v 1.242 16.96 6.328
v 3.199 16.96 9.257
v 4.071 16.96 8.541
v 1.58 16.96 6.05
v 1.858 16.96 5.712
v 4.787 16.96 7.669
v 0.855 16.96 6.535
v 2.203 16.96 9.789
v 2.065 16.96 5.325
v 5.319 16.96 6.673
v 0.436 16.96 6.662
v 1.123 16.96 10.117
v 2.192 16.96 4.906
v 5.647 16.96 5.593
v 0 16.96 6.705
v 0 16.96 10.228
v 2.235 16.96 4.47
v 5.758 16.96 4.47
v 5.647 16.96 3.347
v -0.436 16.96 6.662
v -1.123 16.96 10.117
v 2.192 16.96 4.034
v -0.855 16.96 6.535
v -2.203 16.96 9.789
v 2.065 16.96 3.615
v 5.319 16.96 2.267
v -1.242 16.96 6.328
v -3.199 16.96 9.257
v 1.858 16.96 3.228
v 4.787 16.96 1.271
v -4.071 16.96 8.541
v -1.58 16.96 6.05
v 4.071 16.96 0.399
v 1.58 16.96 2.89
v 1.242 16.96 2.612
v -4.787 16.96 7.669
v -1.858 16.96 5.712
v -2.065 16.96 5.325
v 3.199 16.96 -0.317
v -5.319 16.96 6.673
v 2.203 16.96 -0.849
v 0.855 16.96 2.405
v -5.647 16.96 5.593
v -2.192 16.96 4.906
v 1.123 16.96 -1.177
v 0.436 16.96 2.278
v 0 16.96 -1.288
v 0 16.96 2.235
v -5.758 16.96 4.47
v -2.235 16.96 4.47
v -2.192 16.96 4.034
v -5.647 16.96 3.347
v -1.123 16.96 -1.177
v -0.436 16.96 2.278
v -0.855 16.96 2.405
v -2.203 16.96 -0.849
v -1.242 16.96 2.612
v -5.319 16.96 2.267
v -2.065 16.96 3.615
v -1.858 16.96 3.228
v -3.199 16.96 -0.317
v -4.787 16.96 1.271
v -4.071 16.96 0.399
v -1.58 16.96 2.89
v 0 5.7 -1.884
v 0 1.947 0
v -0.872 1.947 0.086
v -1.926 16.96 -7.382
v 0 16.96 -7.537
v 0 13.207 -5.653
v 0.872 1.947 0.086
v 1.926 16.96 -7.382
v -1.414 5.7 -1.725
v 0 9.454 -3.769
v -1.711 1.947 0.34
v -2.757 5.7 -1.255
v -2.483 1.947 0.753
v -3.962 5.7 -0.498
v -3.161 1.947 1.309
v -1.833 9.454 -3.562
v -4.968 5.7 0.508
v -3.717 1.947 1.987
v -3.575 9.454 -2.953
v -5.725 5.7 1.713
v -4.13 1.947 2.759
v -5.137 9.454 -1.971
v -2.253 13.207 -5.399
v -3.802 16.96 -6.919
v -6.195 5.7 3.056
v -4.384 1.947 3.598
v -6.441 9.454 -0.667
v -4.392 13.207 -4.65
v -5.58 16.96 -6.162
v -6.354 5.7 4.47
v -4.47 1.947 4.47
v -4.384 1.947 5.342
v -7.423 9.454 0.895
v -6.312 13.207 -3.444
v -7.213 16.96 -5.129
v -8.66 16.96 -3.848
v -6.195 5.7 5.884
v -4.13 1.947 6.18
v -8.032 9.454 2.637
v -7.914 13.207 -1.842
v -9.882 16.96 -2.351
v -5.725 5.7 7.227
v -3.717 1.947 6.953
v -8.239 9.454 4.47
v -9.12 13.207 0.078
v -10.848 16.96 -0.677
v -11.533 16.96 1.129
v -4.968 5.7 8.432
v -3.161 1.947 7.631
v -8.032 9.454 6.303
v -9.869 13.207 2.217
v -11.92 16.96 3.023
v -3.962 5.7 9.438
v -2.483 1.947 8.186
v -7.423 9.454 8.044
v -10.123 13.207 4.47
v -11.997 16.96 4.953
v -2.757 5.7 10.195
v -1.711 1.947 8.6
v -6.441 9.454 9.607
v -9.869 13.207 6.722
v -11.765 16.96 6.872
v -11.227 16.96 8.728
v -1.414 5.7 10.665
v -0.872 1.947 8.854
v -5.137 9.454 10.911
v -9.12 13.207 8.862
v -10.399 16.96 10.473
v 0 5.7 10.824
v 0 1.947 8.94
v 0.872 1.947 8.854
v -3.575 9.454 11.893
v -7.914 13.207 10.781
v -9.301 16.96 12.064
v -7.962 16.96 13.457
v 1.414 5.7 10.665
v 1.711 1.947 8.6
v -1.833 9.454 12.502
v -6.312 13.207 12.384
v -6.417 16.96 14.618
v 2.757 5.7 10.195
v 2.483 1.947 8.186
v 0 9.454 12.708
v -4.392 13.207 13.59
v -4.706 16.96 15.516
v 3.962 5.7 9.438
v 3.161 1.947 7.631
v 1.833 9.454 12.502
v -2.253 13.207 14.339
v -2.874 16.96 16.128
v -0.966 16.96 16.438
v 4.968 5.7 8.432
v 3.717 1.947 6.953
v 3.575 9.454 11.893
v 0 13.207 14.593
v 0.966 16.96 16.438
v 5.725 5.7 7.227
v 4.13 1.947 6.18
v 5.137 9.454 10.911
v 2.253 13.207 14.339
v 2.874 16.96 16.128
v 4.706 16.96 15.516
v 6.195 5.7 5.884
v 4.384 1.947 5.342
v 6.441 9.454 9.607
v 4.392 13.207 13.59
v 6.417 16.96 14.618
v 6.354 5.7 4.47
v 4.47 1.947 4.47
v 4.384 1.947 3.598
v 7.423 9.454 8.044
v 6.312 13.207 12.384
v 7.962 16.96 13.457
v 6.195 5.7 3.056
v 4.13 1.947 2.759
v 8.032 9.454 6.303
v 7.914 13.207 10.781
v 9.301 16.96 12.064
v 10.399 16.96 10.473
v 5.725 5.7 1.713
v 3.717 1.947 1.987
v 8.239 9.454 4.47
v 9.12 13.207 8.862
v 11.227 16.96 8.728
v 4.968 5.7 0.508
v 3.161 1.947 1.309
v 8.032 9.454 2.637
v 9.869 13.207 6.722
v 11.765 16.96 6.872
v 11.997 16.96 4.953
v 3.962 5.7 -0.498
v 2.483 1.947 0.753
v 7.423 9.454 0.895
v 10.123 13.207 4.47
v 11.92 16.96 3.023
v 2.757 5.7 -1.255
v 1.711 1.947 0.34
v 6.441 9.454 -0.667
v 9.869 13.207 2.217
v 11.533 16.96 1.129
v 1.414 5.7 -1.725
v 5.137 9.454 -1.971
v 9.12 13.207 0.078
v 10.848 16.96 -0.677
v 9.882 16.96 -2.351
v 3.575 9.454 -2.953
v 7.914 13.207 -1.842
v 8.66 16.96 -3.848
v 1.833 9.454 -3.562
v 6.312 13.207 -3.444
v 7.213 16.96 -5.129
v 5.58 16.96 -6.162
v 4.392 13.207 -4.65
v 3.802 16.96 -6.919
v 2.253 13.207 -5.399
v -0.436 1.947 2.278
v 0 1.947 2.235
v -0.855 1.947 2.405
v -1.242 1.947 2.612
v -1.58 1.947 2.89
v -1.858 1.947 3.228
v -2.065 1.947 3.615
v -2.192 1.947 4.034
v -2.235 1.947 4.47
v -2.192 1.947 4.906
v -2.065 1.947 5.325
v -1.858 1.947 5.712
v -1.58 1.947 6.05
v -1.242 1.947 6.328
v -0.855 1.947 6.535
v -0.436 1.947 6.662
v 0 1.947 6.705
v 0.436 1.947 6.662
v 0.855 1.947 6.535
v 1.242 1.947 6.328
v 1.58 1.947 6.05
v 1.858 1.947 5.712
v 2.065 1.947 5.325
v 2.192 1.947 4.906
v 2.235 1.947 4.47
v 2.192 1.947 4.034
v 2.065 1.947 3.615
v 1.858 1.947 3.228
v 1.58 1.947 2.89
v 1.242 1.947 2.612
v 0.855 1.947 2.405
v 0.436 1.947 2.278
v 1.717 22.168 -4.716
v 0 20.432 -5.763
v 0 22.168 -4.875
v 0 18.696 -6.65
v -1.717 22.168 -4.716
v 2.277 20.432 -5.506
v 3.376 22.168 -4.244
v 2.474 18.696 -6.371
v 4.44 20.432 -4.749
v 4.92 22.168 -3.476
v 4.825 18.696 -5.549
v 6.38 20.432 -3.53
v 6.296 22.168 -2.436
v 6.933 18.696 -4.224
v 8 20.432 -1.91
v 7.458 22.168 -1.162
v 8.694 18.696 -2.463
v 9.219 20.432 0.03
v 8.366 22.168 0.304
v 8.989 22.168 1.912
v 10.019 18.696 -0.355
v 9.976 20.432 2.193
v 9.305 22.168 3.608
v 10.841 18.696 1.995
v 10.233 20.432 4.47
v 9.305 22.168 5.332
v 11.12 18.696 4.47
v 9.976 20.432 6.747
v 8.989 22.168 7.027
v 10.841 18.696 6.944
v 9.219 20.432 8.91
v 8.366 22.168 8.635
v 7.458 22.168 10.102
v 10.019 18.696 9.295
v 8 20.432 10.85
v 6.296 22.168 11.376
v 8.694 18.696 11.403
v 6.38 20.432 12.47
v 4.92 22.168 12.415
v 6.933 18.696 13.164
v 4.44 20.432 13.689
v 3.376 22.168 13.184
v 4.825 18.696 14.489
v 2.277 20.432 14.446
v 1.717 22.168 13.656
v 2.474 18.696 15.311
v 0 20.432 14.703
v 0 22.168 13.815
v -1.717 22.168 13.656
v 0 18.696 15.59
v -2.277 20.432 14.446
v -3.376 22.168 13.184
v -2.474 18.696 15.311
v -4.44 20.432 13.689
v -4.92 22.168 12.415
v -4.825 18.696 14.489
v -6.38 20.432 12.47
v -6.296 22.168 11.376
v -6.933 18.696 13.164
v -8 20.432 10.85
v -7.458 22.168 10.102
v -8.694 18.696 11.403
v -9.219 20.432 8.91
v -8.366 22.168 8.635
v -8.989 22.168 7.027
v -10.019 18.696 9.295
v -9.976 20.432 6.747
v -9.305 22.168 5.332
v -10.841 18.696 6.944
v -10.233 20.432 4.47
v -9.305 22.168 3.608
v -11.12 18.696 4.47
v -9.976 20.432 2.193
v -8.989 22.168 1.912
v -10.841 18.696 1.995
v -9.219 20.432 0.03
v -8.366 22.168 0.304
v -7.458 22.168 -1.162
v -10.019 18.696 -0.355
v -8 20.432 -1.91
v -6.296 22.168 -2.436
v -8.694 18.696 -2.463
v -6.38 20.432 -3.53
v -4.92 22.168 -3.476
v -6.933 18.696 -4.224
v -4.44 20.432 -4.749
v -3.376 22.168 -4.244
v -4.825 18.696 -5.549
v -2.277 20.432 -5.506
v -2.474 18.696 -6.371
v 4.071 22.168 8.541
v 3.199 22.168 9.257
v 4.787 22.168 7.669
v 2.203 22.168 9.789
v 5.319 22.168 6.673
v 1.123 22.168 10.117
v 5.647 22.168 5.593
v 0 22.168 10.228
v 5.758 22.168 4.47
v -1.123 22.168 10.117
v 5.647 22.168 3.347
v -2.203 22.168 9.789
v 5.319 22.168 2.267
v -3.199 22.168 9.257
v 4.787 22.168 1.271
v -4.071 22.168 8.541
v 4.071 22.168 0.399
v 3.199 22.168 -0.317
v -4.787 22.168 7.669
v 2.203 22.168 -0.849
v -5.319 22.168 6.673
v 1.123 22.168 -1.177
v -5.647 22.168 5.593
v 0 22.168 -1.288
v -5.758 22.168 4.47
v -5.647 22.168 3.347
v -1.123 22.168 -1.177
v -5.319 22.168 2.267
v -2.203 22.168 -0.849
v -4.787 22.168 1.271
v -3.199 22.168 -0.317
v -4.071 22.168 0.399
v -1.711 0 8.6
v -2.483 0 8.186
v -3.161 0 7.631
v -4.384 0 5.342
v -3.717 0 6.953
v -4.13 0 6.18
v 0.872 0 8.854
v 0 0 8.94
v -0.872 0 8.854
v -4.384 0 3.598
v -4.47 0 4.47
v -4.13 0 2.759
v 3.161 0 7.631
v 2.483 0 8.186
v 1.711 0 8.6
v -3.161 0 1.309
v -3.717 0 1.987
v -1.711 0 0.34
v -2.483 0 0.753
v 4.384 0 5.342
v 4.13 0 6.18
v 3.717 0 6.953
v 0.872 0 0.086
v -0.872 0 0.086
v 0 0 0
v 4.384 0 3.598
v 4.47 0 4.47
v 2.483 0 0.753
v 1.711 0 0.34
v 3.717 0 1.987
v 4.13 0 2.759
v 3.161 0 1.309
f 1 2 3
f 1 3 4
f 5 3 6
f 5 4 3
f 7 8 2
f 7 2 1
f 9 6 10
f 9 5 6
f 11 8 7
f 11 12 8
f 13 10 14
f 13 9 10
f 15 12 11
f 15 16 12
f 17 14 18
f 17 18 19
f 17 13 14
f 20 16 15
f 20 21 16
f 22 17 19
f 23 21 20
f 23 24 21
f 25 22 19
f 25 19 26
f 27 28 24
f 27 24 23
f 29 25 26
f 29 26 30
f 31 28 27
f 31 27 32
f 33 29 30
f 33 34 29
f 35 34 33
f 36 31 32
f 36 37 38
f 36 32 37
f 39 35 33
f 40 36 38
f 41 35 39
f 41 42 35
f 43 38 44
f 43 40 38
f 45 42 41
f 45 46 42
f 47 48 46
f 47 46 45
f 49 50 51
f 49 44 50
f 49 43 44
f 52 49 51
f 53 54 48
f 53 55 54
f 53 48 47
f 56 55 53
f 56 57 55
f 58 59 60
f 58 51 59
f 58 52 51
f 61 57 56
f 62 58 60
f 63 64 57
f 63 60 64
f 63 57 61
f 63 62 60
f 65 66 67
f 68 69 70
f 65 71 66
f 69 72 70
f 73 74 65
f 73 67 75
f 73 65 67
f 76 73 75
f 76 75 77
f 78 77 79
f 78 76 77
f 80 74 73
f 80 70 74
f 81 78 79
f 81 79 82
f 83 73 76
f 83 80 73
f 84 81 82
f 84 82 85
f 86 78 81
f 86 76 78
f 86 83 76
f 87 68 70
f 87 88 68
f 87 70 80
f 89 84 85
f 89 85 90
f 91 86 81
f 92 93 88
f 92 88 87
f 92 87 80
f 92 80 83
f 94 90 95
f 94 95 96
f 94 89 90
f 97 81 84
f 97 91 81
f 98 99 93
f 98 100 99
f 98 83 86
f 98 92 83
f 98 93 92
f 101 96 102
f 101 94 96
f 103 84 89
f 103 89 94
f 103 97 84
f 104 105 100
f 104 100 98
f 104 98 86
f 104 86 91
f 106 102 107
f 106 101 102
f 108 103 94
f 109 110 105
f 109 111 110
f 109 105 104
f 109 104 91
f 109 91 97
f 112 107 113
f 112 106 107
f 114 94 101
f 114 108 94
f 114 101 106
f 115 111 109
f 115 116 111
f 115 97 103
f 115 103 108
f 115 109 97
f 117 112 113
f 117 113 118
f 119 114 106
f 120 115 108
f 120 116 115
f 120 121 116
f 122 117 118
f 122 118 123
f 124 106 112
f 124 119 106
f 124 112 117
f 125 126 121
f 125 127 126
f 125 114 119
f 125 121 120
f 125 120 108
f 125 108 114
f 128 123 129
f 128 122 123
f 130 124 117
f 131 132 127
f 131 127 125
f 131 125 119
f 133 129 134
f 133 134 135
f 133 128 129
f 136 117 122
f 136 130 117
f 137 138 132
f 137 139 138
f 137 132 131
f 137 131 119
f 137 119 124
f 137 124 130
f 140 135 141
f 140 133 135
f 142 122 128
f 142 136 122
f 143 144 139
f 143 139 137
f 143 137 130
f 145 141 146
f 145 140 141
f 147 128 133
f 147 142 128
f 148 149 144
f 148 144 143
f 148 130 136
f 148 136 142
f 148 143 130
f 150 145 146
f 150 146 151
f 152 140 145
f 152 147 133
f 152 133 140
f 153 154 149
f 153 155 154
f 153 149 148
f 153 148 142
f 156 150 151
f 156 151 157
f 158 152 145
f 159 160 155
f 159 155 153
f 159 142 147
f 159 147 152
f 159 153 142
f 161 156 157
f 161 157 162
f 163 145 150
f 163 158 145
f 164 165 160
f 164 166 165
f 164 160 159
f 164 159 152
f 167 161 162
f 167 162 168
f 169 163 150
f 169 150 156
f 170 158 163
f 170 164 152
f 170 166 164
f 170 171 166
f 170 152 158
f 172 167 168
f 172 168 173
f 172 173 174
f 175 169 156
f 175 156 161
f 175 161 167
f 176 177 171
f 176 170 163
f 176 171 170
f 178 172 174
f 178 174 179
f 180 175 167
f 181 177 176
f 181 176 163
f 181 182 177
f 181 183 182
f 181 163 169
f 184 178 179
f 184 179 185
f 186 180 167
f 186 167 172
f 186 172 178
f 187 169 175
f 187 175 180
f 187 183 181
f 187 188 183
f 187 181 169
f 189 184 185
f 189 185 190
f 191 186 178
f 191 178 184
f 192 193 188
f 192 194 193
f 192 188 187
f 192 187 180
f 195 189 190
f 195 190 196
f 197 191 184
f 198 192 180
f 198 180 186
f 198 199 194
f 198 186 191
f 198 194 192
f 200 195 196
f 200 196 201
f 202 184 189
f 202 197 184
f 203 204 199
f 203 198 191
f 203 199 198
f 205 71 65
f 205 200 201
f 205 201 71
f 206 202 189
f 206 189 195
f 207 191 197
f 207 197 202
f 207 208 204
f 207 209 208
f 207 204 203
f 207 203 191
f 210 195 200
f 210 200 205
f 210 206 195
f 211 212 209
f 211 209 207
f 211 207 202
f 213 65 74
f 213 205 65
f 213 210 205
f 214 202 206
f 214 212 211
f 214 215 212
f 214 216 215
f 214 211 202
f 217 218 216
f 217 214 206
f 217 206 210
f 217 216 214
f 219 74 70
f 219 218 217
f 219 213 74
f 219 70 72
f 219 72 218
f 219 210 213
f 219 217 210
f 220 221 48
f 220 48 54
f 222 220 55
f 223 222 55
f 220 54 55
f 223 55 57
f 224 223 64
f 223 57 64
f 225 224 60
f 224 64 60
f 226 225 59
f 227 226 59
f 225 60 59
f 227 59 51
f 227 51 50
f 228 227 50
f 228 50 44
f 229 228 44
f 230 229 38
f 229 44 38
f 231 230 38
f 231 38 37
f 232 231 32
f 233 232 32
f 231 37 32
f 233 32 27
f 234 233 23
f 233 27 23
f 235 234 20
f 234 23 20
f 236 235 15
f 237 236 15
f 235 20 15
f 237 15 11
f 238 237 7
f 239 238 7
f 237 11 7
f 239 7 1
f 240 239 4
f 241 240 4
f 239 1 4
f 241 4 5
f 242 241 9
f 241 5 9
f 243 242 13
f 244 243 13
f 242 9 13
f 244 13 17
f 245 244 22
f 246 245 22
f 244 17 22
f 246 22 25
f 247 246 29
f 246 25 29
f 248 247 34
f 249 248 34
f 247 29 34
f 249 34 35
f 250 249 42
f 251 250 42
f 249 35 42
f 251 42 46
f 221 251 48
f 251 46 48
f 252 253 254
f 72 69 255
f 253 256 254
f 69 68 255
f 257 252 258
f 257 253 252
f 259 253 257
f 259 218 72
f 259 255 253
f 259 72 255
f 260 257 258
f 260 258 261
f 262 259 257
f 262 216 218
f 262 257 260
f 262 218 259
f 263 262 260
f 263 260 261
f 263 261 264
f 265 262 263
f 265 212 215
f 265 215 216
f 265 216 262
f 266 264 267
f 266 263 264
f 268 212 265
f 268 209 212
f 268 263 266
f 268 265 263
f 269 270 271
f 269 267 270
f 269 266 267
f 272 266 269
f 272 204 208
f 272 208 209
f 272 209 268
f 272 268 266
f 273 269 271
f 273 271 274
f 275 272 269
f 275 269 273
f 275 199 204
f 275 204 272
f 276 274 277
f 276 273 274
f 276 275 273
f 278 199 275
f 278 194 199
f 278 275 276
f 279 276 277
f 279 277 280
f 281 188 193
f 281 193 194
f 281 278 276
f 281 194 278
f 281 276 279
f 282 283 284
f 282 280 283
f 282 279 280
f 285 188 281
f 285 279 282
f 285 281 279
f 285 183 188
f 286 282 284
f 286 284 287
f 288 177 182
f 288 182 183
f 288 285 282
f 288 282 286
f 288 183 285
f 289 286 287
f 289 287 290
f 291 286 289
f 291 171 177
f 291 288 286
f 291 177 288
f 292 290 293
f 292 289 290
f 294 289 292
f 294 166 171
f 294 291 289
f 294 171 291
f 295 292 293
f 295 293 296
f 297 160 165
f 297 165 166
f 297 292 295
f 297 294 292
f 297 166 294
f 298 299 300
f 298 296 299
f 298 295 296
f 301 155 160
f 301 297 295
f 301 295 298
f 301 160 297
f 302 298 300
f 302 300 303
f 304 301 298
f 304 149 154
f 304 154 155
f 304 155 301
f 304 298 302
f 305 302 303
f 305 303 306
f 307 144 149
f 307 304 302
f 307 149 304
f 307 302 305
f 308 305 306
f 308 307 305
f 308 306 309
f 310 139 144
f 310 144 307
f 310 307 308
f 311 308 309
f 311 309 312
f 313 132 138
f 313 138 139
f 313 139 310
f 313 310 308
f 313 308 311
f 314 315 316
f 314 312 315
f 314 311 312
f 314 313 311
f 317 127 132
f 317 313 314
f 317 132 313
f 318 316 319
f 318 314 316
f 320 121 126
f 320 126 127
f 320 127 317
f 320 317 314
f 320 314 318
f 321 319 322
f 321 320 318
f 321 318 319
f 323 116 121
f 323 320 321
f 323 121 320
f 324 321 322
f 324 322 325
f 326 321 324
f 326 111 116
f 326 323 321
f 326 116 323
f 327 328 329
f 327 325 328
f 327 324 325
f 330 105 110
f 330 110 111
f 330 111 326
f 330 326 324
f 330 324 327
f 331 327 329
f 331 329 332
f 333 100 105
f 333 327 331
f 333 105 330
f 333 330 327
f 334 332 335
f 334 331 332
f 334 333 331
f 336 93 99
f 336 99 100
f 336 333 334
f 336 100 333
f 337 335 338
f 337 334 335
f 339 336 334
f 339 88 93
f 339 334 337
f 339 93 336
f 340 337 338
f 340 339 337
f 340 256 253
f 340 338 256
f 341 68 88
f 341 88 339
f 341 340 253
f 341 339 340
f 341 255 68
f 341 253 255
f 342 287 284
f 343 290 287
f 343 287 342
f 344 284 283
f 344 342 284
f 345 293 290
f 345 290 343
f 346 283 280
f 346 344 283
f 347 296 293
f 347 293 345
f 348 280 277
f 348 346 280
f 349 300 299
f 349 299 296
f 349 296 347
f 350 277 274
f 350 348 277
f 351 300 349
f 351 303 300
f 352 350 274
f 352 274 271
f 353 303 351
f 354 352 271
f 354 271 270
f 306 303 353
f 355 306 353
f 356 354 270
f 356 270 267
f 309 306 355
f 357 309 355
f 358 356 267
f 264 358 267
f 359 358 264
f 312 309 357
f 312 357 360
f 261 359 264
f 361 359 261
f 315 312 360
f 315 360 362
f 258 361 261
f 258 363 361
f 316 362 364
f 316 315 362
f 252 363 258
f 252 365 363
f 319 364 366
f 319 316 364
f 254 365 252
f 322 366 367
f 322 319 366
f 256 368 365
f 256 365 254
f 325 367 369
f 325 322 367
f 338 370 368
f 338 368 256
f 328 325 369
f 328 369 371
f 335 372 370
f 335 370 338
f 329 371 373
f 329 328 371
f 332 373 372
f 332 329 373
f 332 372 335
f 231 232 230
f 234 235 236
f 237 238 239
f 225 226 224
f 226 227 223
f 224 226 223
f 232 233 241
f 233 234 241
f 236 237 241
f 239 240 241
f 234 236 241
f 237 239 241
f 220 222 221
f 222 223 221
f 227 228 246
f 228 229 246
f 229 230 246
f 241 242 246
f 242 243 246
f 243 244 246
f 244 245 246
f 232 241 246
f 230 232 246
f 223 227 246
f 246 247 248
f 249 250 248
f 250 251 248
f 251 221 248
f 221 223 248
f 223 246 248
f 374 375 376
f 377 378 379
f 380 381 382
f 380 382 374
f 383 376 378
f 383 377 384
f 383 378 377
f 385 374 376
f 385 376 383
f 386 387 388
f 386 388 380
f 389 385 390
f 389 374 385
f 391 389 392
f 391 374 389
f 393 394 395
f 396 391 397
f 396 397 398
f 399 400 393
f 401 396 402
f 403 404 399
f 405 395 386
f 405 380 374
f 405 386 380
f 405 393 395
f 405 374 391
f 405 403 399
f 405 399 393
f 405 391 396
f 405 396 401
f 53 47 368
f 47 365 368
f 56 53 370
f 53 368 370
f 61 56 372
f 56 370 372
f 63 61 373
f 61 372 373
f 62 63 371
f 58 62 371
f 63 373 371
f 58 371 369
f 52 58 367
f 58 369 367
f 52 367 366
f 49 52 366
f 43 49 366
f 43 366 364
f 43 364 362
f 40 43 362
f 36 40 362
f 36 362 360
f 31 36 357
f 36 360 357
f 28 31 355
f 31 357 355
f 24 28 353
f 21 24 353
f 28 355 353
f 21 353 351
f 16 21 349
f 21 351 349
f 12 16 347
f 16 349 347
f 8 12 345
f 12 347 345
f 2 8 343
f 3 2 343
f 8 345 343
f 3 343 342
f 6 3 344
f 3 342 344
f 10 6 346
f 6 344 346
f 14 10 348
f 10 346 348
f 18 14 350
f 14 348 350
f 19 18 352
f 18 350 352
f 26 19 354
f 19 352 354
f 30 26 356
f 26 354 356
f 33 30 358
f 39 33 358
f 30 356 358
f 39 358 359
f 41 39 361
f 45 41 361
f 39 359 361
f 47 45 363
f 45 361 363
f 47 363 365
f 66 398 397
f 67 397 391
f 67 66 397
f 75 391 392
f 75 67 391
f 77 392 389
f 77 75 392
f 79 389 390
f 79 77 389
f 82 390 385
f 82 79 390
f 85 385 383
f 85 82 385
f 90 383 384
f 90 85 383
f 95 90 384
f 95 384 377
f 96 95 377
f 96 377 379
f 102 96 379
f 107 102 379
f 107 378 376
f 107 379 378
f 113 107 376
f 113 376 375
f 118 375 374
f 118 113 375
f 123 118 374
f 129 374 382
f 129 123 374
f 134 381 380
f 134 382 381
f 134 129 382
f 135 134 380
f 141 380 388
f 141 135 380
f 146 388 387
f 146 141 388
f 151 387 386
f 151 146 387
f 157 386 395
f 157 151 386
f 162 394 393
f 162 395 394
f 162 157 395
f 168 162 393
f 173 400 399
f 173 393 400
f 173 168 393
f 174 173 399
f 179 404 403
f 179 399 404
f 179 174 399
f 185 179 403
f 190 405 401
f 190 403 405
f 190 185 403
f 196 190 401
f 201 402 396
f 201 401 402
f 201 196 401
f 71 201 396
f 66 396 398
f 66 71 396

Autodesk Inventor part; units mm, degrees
ref_plane "YZ Plane" through (0, 0, 0) normal (1, 0, 0) x (0, 1, 0)
ref_plane "XZ Plane" through (0, 0, 0) normal (0, 1, 0) x (-1, 0, 0)
ref_plane "XY Plane" through (0, 0, 0) normal (0, 0, 1) x (1, 0, 0)
sketch "Sketch1" plane through (0, 0, 0) normal (1, 0, 0) x (0, 1, 0)
  line L0 (1.947, 4.4699) -> (0, 4.4699)
  line L1 (0, 4.4699) -> (0, 0)
  line L2 (0, 0) -> (1.947, 0)
  line L3 (1.947, 0) -> (1.947, 4.4699)
sketch "Sketch2" plane through (0, 0, 0) normal (1, 0, 0) x (0, 1, 0)
  line L0 (1.947, 0) -> (1.947, 4.4699) projected
  line L1 (0, 0) -> (1.947, 0) projected
  line L2 (1.947, 4.4699) -> (0, 4.4699) projected
  line L3 (16.9602, -1.2877) -> (22.1681, -1.2877)
  line L4 (22.1681, -1.2877) -> (22.1681, -4.8754)
  line L5 (22.1681, -4.8754) -> (16.9602, -7.5373)
  line L6 (16.9602, -7.5373) -> (1.947, 0)
  line L7 (1.947, 2.235) -> (16.9602, 2.235)
  line L8 (16.9602, 2.235) -> (16.9602, -1.2877)
  line L9 (1.947, 4.4699) -> (5.6822, 4.4699)
sketch "Sketch3" plane through (0, 0, 0) normal (1, 0, 0) x (0, 1, 0)
  point P0 (0, 0)
revolve "Revolution1" add sketch "Sketch2" angle 360 about axis through (0, 1.947, 4.4699) along (0, 1, 0)
revolve "Revolution2" add sketch "Sketch1" angle 360 about axis through (0, 1.947, 4.4699) along (0, -1, 0)
properties part number "Train smoke stack" material "ABS Plastic"
